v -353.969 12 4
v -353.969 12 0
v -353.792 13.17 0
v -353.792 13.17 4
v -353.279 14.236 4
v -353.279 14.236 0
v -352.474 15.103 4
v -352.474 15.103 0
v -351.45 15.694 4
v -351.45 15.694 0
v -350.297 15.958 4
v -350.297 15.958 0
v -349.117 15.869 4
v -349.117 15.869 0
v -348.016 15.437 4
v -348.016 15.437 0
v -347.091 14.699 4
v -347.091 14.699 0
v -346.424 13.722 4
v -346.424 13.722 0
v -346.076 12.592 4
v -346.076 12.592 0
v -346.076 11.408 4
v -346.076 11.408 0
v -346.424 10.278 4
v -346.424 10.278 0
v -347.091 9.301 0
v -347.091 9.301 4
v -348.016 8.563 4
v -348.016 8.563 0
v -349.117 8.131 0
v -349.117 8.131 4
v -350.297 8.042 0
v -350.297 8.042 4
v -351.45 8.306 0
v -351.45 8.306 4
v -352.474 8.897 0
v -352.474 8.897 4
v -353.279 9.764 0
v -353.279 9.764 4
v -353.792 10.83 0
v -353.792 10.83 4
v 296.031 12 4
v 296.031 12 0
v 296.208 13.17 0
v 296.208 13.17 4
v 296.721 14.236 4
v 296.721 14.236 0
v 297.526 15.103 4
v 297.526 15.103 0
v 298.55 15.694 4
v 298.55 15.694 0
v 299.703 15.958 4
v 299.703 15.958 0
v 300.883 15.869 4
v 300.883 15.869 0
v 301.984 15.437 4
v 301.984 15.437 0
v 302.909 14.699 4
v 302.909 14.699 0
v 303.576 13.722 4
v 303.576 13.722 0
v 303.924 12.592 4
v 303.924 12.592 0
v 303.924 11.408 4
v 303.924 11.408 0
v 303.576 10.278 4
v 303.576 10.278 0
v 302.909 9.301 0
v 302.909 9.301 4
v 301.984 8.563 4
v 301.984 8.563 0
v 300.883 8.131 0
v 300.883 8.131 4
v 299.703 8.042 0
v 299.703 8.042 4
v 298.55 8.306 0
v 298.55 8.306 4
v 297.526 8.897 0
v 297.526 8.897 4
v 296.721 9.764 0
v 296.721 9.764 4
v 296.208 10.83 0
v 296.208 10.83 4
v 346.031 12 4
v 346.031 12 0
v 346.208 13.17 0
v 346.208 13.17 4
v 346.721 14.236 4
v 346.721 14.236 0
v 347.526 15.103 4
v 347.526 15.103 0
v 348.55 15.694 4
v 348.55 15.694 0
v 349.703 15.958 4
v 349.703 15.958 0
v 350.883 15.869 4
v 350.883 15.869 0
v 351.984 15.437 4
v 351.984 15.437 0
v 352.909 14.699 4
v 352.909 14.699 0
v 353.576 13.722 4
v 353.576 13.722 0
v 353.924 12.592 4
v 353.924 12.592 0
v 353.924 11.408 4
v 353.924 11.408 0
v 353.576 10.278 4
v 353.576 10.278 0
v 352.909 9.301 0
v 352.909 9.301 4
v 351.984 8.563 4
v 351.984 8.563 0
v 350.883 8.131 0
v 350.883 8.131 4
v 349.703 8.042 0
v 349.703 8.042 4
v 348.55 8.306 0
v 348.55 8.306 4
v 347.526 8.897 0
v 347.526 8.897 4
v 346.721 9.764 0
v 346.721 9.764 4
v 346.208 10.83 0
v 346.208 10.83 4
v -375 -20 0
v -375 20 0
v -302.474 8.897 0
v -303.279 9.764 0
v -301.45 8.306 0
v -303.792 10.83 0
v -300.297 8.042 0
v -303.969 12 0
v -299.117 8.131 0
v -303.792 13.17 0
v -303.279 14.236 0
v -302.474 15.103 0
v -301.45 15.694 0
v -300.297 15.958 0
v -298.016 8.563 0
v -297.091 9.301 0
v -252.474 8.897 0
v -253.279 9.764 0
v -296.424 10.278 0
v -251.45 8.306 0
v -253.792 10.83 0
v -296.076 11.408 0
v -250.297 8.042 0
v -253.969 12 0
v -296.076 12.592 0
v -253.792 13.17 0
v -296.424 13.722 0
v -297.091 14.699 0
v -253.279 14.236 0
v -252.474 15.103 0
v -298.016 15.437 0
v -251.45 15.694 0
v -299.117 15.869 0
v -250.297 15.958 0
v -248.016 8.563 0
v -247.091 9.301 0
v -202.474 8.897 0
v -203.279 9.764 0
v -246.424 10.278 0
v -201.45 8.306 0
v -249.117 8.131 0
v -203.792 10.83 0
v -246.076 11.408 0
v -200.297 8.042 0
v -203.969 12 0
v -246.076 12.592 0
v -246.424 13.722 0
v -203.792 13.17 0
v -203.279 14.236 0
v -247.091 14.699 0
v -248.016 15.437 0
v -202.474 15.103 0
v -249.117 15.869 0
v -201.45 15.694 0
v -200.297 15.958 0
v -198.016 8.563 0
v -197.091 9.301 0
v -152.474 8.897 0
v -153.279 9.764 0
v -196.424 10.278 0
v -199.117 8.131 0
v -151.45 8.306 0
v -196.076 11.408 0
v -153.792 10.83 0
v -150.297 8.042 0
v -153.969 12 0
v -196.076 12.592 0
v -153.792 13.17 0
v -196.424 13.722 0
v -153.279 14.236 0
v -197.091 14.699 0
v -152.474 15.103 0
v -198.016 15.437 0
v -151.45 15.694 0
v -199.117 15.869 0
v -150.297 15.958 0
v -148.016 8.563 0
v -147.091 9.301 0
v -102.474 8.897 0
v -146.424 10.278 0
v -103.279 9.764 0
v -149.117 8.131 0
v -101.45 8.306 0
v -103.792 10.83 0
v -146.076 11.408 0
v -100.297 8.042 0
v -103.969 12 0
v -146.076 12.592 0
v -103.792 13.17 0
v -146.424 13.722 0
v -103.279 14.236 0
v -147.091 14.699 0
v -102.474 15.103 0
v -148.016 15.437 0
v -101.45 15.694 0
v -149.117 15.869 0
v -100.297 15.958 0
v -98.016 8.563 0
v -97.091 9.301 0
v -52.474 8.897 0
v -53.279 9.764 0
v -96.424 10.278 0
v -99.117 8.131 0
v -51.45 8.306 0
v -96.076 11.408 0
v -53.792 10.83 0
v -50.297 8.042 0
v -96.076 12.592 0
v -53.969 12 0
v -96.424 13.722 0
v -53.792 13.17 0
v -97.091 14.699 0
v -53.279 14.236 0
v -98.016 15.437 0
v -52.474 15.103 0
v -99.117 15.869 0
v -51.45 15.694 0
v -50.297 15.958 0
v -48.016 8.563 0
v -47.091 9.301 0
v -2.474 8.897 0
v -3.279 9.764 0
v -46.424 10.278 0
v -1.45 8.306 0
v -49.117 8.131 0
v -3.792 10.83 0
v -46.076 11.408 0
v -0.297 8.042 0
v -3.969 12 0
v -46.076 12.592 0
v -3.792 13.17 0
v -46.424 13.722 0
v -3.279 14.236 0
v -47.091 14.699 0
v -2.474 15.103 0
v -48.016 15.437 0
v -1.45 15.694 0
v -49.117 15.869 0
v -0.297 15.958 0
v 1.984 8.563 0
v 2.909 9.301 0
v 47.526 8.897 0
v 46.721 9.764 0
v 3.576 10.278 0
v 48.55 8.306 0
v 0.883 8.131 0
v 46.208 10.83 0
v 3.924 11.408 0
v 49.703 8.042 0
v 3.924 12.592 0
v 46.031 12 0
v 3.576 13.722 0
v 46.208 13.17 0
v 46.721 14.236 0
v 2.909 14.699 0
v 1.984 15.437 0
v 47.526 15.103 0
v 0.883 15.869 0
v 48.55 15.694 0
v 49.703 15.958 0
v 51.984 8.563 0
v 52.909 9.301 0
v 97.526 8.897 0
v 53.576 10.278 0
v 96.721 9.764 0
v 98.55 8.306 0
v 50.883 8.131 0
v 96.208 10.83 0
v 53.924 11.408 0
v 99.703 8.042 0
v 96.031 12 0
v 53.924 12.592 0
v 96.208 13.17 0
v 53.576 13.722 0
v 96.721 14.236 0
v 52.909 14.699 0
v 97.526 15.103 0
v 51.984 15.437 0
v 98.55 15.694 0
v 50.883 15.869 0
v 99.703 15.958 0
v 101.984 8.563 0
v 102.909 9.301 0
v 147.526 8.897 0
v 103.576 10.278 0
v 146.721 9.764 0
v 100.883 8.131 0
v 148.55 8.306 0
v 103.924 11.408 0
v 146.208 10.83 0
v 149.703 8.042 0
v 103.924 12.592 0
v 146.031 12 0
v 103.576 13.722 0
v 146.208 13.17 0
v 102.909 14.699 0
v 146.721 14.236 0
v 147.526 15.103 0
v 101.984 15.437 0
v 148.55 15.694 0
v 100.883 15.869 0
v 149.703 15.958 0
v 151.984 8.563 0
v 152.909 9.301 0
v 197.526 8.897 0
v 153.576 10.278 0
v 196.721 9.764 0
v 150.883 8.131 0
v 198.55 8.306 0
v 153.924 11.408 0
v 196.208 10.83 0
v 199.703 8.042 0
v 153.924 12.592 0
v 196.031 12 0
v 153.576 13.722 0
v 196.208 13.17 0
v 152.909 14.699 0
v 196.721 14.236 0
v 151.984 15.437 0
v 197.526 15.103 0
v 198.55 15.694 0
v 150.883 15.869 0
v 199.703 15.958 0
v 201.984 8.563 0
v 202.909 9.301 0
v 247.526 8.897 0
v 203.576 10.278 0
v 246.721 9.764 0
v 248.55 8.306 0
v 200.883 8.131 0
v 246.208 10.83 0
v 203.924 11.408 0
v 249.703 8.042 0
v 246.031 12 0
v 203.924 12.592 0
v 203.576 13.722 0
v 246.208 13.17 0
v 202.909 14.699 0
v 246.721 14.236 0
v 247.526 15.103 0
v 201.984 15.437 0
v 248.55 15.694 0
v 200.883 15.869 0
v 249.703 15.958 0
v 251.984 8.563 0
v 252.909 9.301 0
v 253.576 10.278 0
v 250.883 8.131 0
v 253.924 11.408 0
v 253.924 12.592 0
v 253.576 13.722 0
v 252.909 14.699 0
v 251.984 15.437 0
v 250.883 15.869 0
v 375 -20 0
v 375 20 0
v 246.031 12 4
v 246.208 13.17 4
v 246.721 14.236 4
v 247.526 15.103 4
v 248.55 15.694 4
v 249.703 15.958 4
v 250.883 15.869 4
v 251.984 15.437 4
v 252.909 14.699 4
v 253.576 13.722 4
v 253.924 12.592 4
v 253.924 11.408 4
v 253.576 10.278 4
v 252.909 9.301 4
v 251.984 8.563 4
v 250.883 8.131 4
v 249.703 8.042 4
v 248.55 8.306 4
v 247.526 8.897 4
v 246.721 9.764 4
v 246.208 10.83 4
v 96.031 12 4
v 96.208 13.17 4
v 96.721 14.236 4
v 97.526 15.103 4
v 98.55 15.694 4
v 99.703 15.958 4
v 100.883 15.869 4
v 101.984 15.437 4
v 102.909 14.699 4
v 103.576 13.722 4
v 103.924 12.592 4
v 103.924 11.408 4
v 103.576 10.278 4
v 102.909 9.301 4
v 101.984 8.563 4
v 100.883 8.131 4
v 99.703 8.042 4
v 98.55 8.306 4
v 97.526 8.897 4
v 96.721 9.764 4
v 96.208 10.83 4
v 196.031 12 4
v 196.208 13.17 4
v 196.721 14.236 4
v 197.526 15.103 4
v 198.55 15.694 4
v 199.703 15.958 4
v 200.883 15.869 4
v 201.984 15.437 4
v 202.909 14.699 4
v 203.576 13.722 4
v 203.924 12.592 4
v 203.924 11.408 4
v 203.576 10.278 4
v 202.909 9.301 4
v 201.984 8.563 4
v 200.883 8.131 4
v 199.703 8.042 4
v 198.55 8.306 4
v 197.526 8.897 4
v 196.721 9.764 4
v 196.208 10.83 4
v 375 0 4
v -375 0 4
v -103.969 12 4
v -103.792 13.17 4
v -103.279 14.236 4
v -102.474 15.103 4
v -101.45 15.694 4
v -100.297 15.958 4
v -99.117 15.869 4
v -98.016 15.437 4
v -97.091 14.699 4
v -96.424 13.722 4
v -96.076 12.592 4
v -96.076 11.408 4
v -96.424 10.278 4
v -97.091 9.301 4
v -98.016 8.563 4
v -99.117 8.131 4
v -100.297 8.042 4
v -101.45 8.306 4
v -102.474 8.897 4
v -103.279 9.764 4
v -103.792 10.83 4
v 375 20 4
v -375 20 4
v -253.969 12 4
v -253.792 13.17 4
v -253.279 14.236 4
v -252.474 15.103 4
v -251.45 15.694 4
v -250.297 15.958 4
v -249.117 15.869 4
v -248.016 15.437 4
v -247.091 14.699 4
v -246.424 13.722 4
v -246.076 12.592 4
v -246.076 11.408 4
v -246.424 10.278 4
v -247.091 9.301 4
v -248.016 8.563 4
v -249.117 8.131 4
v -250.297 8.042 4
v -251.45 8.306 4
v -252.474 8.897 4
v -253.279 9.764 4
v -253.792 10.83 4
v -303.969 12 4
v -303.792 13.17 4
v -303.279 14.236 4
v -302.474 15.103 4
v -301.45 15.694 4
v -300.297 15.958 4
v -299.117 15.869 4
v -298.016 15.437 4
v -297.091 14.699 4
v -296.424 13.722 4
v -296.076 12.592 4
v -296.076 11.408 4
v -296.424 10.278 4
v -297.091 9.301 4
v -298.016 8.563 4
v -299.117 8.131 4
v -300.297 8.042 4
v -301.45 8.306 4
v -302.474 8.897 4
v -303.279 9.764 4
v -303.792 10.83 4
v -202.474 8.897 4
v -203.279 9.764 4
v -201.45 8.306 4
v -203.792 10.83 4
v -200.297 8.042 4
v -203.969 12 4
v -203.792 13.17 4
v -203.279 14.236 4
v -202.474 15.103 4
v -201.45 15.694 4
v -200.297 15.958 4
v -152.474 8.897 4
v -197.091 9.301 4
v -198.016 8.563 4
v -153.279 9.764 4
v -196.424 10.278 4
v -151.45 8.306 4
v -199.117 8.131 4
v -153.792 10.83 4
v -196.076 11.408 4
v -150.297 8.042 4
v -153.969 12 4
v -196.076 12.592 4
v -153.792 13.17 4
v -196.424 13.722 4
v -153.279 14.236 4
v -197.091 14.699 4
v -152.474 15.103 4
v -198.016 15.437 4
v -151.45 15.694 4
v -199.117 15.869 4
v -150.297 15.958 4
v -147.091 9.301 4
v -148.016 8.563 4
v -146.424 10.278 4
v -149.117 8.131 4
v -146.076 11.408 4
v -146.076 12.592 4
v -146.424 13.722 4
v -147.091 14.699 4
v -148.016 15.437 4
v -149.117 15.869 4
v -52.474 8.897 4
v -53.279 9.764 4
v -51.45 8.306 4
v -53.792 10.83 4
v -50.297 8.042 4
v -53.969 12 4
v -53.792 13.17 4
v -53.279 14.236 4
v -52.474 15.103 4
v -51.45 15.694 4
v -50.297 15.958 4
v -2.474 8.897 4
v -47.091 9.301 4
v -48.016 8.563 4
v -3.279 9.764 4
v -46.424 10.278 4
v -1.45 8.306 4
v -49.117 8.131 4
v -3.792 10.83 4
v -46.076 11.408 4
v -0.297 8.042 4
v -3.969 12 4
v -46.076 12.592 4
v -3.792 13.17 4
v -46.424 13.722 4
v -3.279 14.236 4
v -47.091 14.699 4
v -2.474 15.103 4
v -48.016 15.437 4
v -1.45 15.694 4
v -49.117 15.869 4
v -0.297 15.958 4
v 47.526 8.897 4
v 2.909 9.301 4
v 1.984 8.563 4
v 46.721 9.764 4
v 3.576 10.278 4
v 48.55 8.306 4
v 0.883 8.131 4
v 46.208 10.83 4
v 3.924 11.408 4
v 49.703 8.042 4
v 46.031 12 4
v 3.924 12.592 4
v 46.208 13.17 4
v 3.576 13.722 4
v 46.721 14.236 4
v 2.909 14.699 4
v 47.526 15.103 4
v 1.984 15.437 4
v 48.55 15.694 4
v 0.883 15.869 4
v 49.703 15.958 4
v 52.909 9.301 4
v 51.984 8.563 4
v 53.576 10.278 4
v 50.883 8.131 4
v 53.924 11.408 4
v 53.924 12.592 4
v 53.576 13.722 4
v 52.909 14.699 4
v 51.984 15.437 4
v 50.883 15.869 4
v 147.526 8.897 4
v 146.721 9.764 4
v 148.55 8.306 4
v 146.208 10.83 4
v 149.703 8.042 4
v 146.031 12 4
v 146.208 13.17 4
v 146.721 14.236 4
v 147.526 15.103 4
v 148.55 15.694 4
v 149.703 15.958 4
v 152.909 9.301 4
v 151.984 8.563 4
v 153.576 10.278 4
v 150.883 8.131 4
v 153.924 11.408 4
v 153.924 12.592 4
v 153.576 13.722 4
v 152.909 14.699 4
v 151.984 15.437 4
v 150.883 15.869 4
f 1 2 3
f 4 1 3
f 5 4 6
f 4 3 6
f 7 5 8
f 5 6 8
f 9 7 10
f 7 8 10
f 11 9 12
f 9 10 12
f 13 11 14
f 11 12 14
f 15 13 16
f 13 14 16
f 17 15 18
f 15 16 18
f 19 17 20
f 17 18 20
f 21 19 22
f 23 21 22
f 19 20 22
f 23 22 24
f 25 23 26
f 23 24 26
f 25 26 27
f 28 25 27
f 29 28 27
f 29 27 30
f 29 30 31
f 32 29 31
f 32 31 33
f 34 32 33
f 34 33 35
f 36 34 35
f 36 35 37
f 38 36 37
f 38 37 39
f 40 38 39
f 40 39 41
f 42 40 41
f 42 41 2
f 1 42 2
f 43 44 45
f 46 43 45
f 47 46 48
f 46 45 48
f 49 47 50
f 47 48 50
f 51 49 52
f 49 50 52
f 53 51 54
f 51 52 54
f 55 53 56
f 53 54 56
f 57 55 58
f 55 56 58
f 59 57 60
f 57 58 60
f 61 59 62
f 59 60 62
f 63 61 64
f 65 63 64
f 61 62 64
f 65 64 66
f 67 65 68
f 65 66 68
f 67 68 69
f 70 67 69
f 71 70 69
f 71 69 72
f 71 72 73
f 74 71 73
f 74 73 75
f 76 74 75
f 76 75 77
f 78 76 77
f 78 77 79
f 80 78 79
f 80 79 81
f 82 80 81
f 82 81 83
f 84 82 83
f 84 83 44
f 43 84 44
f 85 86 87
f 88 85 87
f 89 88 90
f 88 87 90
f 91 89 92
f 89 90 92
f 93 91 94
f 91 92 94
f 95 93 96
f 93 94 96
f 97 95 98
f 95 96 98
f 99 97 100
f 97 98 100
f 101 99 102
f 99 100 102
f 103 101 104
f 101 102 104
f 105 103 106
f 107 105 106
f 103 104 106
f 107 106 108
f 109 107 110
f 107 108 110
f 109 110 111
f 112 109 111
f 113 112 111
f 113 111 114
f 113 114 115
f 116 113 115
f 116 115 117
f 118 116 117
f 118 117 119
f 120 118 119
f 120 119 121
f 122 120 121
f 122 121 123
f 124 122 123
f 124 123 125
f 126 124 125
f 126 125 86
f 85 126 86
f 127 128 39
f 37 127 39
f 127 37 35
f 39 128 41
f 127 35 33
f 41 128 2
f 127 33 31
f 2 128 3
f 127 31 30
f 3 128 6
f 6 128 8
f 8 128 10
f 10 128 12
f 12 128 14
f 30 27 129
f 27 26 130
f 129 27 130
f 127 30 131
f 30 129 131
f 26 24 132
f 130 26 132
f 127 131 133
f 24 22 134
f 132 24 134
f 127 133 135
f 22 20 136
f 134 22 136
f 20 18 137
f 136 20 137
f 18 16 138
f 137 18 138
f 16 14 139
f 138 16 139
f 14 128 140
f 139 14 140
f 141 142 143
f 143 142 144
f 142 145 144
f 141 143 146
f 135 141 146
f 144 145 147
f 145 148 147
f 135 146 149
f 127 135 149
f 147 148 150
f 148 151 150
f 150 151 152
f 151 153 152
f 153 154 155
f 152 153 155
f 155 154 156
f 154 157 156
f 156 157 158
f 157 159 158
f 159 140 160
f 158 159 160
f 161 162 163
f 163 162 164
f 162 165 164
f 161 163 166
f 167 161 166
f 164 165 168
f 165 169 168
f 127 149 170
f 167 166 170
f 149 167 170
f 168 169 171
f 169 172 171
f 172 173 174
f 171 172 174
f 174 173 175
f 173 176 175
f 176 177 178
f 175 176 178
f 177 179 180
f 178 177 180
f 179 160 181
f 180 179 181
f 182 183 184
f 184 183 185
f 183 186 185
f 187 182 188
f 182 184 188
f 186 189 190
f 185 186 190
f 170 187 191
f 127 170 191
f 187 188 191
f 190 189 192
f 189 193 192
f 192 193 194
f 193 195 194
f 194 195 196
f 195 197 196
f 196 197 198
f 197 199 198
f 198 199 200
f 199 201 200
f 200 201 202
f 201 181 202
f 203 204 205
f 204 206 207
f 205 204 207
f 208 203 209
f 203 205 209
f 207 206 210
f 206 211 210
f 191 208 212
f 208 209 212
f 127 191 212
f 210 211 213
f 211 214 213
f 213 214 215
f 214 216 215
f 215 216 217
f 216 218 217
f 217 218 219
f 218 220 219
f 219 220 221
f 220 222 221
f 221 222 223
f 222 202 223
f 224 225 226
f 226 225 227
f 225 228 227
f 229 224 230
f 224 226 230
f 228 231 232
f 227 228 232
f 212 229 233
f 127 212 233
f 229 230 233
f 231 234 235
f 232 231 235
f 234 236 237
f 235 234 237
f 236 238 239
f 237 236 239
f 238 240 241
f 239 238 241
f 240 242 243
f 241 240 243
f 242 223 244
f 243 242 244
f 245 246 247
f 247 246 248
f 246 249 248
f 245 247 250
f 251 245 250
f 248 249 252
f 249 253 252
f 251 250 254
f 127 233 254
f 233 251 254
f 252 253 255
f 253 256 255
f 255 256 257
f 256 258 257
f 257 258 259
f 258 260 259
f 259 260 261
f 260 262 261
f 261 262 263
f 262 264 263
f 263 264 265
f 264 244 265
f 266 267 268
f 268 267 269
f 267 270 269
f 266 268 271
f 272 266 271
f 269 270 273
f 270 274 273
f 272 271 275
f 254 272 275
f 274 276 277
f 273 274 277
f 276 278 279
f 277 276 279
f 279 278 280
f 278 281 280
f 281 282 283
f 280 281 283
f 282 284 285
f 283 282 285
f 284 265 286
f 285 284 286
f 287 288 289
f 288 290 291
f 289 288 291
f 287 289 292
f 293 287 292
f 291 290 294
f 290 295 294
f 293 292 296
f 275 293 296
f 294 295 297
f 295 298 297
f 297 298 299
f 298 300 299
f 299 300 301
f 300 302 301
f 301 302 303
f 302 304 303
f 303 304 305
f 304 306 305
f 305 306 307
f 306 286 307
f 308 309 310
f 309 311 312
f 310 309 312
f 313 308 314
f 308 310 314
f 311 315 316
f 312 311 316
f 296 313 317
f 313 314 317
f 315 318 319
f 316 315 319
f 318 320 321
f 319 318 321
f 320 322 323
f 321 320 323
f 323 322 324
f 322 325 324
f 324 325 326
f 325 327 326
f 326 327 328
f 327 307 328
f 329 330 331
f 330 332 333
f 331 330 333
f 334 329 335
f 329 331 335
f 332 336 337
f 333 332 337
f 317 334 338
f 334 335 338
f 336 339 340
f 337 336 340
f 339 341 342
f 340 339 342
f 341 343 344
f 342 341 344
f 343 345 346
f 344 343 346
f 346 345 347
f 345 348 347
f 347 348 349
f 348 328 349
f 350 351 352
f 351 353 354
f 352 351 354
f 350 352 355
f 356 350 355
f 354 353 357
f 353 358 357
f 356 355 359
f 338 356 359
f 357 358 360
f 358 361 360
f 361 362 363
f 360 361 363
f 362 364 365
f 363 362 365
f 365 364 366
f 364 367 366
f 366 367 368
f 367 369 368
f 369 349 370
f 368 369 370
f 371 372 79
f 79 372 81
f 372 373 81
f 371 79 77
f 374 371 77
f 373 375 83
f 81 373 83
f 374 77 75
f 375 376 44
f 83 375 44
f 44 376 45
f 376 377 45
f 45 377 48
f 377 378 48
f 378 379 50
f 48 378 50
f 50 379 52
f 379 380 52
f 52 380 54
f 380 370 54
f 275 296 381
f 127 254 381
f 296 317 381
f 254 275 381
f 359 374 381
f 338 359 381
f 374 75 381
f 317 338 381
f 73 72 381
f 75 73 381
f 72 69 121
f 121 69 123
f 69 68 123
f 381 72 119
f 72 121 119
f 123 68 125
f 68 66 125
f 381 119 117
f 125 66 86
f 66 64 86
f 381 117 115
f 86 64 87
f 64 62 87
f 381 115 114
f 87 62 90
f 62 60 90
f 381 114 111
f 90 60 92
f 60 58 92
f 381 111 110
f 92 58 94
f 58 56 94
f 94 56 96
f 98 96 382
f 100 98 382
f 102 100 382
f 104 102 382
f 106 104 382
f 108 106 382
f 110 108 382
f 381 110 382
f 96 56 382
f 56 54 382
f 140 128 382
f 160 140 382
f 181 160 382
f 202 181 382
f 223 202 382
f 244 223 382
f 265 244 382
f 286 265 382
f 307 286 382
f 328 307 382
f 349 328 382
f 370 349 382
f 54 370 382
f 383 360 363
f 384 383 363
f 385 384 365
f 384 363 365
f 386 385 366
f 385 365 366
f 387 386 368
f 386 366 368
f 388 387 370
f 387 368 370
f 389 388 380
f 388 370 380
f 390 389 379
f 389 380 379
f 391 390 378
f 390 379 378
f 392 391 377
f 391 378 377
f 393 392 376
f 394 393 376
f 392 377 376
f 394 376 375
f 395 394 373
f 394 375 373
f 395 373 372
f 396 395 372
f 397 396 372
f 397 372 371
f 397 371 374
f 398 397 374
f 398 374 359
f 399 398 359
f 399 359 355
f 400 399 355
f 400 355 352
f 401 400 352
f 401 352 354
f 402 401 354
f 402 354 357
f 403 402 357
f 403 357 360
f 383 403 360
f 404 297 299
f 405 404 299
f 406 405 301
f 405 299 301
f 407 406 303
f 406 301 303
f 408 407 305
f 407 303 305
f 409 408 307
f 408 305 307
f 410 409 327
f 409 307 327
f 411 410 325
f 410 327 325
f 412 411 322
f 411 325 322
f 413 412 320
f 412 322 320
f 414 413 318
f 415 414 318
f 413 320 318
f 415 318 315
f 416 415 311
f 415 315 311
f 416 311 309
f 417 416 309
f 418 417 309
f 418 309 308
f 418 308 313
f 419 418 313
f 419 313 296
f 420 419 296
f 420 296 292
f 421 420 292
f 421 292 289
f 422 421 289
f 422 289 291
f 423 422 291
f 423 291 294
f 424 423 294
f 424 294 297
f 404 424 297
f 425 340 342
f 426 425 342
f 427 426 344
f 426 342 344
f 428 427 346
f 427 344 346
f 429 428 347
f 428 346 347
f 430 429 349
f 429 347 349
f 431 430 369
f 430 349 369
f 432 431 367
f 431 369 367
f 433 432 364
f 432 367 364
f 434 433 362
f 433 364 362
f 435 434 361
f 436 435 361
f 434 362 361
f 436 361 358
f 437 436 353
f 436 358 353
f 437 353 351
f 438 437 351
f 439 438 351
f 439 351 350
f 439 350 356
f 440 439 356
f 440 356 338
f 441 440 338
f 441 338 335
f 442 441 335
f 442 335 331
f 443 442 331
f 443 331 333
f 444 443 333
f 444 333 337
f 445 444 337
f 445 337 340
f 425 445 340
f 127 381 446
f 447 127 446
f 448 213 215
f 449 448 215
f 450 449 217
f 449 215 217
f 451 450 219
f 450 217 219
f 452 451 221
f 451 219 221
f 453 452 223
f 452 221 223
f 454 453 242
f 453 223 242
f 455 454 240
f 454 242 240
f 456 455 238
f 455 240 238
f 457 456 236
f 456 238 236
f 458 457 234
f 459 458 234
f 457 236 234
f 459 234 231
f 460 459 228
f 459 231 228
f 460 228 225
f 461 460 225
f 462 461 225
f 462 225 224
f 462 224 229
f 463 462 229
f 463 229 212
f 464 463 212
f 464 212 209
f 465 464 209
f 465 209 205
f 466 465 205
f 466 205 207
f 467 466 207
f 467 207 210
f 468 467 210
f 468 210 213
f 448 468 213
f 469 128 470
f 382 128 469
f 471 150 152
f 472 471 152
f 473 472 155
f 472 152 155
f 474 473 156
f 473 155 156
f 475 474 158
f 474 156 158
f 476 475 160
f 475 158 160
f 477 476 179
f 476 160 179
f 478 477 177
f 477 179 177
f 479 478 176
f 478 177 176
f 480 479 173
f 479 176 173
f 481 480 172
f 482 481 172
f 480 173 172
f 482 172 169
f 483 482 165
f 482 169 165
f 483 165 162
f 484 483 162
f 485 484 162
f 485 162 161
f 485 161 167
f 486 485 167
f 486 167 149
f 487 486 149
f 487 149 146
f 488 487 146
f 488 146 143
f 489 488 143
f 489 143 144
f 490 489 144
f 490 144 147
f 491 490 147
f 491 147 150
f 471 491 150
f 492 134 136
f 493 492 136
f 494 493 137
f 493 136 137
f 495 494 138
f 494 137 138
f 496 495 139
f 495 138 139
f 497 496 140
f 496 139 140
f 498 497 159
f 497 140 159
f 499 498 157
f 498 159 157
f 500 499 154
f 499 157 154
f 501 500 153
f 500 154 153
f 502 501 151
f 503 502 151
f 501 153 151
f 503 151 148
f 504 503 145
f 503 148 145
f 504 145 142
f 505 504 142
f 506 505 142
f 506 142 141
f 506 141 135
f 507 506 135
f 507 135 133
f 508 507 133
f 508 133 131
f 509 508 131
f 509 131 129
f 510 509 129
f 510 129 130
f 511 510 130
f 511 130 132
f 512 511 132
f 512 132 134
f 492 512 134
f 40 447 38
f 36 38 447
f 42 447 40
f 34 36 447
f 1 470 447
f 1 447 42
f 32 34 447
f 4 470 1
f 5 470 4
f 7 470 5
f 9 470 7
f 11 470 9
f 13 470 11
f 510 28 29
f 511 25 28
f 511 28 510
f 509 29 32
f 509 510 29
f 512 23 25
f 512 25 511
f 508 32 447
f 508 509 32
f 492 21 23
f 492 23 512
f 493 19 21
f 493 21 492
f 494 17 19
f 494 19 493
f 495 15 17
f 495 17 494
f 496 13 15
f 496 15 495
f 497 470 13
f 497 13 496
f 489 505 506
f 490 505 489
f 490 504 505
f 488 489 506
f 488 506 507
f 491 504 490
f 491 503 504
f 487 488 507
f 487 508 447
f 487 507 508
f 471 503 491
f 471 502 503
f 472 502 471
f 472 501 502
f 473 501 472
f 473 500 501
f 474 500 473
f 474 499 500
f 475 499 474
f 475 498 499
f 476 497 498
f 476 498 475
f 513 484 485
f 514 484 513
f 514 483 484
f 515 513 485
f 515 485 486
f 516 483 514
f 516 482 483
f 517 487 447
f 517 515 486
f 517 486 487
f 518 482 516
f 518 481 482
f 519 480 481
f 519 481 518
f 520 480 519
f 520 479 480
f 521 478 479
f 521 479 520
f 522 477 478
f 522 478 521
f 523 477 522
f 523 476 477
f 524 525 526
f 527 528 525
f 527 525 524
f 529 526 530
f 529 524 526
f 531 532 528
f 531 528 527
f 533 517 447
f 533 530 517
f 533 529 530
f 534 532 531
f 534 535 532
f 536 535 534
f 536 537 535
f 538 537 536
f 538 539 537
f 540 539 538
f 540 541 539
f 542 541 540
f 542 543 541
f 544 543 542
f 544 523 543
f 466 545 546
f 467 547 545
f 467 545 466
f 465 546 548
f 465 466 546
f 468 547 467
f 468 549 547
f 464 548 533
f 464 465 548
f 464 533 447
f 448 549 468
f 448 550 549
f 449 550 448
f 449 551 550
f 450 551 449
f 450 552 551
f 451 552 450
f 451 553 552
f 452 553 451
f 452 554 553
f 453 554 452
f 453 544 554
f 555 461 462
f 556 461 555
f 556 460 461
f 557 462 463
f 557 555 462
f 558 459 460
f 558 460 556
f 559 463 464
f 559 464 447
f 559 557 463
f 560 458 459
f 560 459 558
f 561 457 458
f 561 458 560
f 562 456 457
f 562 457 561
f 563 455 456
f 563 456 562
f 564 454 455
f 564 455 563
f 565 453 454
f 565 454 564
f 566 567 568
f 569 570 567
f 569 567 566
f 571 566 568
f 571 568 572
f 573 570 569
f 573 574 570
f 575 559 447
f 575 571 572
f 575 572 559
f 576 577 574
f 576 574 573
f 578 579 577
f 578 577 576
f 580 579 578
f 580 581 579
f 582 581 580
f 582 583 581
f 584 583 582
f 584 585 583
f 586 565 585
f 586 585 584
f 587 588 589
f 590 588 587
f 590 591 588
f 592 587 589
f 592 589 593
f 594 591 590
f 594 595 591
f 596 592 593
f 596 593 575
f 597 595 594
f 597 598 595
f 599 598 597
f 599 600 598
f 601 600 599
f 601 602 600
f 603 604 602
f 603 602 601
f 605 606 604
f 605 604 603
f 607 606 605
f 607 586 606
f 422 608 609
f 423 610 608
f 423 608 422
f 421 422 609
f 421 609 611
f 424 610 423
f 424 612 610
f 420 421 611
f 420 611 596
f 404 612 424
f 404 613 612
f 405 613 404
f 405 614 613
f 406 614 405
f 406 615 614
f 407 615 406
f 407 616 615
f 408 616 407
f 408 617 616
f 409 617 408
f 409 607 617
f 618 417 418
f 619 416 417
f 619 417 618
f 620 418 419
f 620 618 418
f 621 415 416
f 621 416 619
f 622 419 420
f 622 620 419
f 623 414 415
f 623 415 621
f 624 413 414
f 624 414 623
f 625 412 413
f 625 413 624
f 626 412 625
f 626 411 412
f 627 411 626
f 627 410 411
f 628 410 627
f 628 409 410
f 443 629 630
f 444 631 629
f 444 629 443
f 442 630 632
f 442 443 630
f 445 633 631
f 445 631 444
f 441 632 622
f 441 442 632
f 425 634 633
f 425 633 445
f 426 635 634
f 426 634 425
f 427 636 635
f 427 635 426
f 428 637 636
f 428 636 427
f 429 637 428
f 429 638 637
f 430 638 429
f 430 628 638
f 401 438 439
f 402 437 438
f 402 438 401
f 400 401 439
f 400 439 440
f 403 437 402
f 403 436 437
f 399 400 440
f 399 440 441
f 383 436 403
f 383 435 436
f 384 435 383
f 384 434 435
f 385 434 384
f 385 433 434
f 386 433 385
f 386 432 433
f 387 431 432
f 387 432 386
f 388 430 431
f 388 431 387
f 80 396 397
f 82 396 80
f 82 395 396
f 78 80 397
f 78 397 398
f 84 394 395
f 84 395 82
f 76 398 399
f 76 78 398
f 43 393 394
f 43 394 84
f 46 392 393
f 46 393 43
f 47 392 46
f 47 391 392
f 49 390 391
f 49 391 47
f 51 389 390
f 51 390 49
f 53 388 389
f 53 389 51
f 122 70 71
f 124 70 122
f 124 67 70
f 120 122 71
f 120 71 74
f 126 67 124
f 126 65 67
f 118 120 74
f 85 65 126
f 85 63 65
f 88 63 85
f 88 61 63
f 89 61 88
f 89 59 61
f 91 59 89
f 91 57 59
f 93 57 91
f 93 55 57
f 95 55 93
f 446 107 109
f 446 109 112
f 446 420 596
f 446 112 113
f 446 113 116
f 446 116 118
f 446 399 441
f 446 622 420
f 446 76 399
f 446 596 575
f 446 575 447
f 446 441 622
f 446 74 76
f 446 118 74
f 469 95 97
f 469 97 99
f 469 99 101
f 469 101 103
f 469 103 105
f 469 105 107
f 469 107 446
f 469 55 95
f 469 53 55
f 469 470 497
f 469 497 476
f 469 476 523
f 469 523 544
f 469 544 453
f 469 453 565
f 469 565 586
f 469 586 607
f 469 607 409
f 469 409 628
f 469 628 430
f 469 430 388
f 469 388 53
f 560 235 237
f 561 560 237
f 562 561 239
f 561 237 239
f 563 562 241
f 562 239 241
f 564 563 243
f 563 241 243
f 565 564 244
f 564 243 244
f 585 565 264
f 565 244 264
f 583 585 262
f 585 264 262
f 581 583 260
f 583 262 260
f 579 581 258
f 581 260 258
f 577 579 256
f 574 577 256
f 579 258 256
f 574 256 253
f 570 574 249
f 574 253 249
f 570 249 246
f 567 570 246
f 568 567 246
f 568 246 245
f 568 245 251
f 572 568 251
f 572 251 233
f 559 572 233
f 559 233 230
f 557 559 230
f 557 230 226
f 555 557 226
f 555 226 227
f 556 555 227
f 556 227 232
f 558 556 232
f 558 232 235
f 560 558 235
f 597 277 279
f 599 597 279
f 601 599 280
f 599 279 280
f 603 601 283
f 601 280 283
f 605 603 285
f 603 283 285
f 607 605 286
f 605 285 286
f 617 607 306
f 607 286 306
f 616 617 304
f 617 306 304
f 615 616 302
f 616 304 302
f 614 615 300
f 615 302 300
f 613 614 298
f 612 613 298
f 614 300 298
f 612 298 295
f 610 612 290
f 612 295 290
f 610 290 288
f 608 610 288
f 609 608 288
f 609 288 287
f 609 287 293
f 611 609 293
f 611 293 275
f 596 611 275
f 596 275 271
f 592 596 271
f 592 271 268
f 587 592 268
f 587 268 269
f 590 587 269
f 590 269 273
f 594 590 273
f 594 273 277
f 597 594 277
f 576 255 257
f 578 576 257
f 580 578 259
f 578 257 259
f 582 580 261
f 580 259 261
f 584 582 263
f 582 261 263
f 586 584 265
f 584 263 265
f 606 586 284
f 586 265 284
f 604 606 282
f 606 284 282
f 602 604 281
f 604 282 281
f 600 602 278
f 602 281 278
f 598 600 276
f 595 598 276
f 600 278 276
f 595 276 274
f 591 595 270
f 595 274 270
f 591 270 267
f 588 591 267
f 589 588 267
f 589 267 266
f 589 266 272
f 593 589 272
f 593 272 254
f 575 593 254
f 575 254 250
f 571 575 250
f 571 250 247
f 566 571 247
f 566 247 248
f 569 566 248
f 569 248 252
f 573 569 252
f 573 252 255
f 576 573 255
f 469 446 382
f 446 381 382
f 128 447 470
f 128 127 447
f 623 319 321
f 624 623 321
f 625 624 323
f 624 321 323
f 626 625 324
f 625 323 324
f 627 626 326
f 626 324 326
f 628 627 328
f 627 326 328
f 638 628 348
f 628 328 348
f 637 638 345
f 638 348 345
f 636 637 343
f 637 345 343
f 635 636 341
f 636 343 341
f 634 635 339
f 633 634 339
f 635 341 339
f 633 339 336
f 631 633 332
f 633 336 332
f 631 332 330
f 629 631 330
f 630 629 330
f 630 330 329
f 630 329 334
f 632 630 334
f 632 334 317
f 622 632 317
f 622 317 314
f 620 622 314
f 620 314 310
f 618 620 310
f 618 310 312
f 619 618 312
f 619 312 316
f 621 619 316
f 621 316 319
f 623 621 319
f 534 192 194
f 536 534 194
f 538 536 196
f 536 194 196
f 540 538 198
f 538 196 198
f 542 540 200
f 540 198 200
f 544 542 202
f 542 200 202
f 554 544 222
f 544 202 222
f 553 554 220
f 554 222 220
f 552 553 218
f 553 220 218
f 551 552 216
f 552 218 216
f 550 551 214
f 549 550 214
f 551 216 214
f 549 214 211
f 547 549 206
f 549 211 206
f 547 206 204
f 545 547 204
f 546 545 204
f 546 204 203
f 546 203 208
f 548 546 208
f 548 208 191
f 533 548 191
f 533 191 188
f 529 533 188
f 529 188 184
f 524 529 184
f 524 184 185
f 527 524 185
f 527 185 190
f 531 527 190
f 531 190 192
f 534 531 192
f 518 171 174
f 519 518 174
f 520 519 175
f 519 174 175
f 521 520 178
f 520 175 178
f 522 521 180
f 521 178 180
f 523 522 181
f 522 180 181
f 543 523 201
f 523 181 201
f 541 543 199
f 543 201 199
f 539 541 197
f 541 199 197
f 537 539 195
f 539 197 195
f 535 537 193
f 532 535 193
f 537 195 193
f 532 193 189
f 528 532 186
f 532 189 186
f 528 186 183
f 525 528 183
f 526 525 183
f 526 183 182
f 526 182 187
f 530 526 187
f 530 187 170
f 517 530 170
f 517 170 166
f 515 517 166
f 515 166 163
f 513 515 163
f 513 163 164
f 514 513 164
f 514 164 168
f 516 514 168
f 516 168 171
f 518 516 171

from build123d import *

# Parameters (mm, degrees)
CROQUIS1_W              = 750
CROQUIS1_H              = 40
SALIENTE_EXTRUIR1_DEPTH = 4
CORTAR_EXTRUIR1_DEPTH   = 751
CROQUIS3_R              = 3.96875
CORTAR_EXTRUIR2_DEPTH   = 10


with BuildPart() as part:
    # Croquis1 → Saliente-Extruir1 (new body)
    with BuildSketch(Plane.XY):
        Rectangle(CROQUIS1_W, CROQUIS1_H)
    extrude(amount=SALIENTE_EXTRUIR1_DEPTH)

    # Croquis2 → Cortar-Extruir1 (cut, through all)
    with BuildSketch(Plane(origin=(375, 0, 0), x_dir=(0, 0, -1), z_dir=(1, 0, 0))):
        Polygon((-4, -20), (0, -20), (-4, 0), align=None)
    extrude(amount=-CORTAR_EXTRUIR1_DEPTH, mode=Mode.SUBTRACT)

    # Croquis3 → Cortar-Extruir2 (cut)
    with BuildSketch(Plane(origin=(0, 0, 0), x_dir=(-1, 0, 0), z_dir=(0, 0, -1))):
        with Locations((-350, 12)):
            Circle(CROQUIS3_R)
        with Locations((-300, 12)):
            Circle(CROQUIS3_R)
        with Locations((-250, 12)):
            Circle(CROQUIS3_R)
        with Locations((-200, 12)):
            Circle(CROQUIS3_R)
        with Locations((-150, 12)):
            Circle(CROQUIS3_R)
        with Locations((-100, 12)):
            Circle(CROQUIS3_R)
        with Locations((-50, 12)):
            Circle(CROQUIS3_R)
        with Locations((0, 12)):
            Circle(CROQUIS3_R)
        with Locations((50, 12)):
            Circle(CROQUIS3_R)
        with Locations((100, 12)):
            Circle(CROQUIS3_R)
        with Locations((150, 12)):
            Circle(CROQUIS3_R)
        with Locations((200, 12)):
            Circle(CROQUIS3_R)
        with Locations((250, 12)):
            Circle(CROQUIS3_R)
        with Locations((300, 12)):
            Circle(CROQUIS3_R)
        with Locations((350, 12)):
            Circle(CROQUIS3_R)
    extrude(amount=-CORTAR_EXTRUIR2_DEPTH, mode=Mode.SUBTRACT)


solid = part.part
